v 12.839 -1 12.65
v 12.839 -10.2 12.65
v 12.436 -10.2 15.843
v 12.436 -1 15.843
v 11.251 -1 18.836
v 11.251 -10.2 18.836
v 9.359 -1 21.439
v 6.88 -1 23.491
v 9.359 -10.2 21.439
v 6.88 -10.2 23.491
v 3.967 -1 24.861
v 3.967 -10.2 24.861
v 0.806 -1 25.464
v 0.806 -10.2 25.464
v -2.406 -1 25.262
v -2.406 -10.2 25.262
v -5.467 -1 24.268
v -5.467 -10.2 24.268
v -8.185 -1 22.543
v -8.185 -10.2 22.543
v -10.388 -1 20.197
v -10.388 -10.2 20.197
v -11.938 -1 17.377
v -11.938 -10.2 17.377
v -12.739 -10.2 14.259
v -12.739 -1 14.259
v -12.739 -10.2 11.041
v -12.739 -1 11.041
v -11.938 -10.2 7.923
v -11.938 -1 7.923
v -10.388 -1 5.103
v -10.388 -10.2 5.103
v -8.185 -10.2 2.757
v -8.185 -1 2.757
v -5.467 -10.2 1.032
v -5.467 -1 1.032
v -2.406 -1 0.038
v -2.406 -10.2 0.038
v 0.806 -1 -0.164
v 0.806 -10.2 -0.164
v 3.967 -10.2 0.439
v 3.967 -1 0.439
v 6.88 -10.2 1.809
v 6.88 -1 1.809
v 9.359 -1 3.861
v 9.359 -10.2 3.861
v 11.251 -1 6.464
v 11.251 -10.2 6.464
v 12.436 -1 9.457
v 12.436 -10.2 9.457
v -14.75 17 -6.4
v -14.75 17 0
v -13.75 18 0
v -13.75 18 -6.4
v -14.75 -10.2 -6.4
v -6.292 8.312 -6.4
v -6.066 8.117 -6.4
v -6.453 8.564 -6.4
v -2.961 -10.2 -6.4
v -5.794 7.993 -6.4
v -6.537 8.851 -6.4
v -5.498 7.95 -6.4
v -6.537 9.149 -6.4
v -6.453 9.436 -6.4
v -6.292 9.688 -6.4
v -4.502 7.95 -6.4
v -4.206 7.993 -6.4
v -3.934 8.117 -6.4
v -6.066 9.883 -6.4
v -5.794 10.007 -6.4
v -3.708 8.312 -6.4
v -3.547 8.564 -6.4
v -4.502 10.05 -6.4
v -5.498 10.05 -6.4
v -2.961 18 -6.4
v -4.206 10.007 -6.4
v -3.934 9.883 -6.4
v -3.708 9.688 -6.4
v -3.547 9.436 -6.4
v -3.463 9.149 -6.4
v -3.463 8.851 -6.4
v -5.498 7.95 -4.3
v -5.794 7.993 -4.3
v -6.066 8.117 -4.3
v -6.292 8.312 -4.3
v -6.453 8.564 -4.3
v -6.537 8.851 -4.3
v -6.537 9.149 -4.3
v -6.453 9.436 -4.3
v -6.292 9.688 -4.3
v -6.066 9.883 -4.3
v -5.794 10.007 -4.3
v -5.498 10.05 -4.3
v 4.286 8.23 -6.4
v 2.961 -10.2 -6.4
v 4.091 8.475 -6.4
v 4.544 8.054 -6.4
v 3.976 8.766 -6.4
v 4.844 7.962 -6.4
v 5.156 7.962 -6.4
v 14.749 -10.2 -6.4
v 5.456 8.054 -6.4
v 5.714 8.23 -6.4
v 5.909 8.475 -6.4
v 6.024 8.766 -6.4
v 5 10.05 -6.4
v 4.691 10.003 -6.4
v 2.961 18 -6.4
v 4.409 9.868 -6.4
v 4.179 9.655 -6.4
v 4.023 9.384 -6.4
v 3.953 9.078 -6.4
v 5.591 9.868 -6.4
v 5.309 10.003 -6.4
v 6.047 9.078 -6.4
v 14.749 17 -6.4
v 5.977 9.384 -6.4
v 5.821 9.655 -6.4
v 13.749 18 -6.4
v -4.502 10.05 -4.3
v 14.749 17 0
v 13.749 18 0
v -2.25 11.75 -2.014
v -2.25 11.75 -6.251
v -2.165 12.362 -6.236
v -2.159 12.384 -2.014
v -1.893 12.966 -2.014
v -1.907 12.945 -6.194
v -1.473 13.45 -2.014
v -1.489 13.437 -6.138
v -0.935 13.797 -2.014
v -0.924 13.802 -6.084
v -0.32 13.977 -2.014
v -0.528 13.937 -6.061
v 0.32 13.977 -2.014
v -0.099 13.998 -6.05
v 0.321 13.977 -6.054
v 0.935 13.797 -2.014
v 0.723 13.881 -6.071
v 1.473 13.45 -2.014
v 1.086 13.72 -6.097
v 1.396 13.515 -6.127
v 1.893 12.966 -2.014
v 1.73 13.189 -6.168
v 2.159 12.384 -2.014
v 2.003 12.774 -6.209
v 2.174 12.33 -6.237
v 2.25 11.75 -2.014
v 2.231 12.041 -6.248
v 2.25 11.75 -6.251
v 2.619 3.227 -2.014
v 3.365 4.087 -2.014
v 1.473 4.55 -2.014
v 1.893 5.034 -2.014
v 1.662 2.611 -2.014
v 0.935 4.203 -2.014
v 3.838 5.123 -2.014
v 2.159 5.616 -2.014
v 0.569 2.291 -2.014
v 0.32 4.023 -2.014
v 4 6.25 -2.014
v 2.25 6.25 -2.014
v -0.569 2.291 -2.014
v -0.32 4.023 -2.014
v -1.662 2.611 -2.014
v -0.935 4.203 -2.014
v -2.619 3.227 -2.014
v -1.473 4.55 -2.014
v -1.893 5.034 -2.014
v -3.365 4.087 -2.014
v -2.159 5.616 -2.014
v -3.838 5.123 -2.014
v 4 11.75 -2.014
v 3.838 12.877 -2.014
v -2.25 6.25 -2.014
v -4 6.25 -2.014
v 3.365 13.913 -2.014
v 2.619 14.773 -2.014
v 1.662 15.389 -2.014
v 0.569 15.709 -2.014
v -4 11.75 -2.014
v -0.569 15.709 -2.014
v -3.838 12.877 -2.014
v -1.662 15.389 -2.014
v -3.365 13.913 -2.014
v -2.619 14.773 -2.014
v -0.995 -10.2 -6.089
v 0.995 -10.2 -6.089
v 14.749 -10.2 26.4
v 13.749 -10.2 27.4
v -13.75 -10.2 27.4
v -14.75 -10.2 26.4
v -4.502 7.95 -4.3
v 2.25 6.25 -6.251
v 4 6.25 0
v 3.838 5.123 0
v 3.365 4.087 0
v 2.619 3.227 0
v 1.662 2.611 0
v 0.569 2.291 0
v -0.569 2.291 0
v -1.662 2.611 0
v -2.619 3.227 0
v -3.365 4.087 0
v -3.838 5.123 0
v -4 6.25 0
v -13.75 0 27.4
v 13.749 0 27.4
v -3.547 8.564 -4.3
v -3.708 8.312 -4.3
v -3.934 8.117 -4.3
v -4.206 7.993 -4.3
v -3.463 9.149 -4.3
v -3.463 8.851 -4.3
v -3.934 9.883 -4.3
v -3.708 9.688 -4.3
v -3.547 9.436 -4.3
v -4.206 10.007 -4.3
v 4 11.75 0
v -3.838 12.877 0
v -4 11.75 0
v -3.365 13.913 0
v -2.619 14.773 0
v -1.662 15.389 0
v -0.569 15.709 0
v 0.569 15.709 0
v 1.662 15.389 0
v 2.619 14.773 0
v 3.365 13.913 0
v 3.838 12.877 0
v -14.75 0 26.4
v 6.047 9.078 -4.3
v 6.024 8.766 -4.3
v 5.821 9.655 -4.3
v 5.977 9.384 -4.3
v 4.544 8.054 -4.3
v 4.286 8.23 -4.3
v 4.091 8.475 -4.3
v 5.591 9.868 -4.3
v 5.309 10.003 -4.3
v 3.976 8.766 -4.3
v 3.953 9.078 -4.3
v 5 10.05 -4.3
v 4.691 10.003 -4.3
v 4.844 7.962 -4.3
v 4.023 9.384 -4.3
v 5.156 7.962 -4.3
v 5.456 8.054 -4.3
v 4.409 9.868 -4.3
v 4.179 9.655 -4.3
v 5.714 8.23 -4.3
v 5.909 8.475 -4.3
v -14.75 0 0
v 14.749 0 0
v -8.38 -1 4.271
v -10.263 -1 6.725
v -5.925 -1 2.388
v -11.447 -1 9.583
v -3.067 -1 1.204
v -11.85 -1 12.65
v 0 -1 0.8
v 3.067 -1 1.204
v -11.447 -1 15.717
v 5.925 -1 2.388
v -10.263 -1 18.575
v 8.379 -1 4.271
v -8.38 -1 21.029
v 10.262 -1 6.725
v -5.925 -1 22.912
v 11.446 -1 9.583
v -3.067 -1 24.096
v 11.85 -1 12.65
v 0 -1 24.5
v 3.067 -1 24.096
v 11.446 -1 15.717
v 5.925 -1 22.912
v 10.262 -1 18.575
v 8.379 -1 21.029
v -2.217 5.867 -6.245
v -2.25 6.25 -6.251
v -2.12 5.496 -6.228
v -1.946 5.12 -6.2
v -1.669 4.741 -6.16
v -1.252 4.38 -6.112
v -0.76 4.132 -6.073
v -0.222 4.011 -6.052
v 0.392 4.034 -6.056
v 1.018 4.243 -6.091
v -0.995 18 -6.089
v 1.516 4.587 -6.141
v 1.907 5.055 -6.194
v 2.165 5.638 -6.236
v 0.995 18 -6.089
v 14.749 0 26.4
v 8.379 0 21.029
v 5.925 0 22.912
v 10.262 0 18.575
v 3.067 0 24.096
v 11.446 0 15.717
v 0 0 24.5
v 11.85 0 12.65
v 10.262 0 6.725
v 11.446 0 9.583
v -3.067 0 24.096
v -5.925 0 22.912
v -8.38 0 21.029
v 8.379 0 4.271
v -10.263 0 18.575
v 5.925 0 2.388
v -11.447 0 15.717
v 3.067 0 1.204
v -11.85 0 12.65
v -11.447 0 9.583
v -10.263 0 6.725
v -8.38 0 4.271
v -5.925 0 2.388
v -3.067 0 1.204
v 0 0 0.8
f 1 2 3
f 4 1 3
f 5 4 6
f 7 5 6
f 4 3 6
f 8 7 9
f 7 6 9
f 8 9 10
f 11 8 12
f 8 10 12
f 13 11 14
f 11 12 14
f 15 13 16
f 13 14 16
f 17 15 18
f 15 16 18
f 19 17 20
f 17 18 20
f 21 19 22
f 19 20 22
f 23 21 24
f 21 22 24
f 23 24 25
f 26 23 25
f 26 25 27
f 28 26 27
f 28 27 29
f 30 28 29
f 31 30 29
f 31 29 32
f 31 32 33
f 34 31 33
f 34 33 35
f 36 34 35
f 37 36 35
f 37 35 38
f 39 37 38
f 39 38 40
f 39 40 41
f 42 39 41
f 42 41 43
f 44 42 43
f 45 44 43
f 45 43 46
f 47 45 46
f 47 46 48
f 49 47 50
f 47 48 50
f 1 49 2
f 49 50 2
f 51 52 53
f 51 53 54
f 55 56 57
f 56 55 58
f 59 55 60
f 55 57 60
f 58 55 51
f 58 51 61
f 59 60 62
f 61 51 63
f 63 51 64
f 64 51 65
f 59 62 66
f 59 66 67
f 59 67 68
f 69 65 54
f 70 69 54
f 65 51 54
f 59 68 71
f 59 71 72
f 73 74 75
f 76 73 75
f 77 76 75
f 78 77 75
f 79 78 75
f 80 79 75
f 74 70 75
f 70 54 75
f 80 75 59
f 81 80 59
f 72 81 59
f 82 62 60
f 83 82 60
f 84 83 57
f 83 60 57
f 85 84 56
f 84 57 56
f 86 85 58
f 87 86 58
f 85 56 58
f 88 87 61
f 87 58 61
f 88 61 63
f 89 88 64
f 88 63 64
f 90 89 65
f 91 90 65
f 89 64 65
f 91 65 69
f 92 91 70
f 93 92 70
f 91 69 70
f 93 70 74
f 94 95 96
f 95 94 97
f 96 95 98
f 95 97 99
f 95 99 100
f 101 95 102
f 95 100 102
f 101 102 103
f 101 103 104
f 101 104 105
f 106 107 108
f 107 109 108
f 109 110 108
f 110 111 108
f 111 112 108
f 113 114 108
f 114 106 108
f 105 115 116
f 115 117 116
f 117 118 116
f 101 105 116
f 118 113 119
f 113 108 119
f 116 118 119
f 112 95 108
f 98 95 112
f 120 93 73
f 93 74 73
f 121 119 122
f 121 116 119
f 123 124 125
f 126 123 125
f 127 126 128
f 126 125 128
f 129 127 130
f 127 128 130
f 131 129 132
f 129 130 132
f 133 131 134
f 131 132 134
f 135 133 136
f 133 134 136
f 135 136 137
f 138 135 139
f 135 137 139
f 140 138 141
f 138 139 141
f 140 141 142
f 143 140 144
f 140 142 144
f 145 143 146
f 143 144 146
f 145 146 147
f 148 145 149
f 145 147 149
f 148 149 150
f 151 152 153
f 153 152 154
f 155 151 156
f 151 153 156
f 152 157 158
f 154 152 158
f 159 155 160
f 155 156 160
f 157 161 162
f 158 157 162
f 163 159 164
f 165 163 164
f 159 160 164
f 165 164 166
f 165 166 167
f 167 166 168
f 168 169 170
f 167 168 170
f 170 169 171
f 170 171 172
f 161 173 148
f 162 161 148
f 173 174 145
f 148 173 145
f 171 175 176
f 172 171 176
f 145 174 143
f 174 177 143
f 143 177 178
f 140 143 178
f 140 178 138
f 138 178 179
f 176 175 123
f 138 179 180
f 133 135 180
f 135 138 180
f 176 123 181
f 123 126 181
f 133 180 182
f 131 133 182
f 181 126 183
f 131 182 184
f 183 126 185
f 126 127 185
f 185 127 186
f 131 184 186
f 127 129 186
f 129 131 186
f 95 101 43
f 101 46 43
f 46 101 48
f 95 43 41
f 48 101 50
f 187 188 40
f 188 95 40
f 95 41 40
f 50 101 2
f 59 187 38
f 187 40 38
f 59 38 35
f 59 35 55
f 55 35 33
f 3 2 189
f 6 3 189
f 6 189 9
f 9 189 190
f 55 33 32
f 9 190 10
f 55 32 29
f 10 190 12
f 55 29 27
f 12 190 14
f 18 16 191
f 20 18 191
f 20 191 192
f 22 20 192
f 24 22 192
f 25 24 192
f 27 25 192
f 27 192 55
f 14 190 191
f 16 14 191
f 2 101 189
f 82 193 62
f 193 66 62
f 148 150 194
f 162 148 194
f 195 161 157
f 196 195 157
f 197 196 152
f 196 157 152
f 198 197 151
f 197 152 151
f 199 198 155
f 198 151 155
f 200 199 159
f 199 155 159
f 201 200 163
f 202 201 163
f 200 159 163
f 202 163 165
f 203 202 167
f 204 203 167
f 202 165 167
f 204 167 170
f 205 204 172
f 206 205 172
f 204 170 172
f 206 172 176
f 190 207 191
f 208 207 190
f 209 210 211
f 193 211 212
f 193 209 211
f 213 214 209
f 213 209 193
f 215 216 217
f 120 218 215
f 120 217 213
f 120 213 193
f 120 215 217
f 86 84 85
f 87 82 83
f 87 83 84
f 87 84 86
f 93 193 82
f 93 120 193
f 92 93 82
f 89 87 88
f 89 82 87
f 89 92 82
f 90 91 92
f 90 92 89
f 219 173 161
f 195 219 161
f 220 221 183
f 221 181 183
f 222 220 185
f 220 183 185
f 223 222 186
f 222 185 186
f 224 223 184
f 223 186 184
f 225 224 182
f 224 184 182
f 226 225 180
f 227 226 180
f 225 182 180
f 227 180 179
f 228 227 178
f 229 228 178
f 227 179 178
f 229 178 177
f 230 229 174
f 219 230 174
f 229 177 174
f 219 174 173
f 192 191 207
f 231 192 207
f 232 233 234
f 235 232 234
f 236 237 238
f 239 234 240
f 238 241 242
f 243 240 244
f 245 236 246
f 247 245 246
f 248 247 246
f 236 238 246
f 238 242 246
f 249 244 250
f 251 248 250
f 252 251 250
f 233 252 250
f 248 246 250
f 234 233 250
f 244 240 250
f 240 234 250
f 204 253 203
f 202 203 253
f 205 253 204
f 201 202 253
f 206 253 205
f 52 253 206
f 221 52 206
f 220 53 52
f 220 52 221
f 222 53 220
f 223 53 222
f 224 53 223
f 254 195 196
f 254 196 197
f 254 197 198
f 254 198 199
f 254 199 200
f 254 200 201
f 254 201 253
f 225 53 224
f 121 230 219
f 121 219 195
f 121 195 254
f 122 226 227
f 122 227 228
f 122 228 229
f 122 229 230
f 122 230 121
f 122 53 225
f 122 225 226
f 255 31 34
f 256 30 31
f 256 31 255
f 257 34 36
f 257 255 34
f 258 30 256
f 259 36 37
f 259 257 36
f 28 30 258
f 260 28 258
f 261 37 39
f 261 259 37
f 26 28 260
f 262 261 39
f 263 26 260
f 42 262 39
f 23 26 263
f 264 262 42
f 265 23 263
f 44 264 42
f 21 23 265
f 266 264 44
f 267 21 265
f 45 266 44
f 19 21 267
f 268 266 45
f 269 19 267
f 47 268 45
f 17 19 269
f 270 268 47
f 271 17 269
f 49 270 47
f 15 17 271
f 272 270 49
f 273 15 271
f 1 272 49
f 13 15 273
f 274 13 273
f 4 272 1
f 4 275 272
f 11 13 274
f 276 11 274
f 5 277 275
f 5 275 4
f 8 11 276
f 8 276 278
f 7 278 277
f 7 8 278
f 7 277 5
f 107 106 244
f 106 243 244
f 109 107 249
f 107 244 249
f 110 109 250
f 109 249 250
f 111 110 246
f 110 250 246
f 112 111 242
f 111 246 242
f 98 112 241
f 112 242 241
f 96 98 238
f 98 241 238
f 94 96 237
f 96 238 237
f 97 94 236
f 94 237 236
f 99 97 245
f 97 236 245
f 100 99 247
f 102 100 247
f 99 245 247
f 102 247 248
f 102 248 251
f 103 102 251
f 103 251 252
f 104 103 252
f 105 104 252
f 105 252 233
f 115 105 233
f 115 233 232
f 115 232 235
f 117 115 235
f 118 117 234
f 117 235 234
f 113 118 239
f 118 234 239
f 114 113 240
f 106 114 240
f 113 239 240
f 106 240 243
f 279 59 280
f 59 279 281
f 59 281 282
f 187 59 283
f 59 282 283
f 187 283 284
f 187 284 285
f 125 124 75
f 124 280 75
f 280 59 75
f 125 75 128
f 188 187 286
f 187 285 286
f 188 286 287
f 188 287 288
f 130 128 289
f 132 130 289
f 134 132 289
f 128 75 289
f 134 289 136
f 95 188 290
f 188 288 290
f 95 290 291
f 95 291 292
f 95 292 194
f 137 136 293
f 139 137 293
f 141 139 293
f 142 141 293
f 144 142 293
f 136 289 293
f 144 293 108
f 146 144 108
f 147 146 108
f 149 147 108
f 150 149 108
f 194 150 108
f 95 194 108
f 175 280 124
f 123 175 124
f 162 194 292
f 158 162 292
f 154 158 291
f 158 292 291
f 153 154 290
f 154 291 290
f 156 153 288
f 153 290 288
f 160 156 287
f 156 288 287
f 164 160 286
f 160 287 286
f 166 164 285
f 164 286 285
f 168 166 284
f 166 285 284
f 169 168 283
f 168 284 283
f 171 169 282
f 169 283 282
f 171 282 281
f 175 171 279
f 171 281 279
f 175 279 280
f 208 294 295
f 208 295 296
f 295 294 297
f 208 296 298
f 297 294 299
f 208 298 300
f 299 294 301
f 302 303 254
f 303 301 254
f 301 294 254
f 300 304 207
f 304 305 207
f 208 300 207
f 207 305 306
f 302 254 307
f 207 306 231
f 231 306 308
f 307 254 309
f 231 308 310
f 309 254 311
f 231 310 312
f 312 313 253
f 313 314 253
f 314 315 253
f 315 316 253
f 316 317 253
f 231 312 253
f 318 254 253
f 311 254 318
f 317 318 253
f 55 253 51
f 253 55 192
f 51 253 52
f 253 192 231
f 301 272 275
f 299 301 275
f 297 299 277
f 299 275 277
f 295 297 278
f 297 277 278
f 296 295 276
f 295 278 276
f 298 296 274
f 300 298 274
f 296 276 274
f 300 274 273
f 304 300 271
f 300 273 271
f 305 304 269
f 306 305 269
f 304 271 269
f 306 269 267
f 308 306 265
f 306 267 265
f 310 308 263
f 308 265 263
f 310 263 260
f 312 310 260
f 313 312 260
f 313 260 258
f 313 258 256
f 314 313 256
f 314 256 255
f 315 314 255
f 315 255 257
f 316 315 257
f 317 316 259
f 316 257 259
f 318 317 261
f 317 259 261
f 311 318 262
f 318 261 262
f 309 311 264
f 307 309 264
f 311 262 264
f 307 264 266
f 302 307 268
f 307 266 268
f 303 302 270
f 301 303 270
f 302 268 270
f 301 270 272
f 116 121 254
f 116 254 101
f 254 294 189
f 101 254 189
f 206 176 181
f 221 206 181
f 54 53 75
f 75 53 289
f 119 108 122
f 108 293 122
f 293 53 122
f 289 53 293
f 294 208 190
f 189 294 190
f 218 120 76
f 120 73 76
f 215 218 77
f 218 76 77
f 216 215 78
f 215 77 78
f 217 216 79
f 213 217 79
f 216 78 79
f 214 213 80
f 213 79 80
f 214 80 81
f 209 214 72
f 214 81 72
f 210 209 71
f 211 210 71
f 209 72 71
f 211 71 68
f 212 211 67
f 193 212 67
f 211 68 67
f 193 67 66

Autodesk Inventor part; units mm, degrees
ref_plane "YZ Plane" through (0, 0, 0) normal (1, 0, 0) x (0, 1, 0)
ref_plane "XZ Plane" through (0, 0, 0) normal (0, 1, 0) x (-1, 0, 0)
ref_plane "XY Plane" through (0, 0, 0) normal (0, 0, 1) x (1, 0, 0)
sketch "Sketch4" plane through (0, 0, 0) normal (0, 0, 1) x (1, 0, 0)
  line L0 (-14.75, 18) -> (14.7494, 18)
  line L1 (14.7494, 18) -> (14.7494, -10.2)
  line L2 (14.7494, -10.2) -> (-14.75, -10.2)
  line L3 (-14.75, -10.2) -> (-14.75, 18)
  point P0 (0, 0)
  dimension "d24" = 28.2
  dimension "WIDTH" = 29.4994
  dimension "d26" = 14.75
  dimension "d28" = 10.2
extrude "Extrusion3" add sketch "Sketch4" against normal blind 6.4
sketch "Sketch5" plane through (0, 0, 0) normal (0, 0, 1) x (1, 0, 0)
  line L0 (-14.75, -10.2) -> (14.7494, -10.2)
  line L1 (14.7494, -10.2) -> (14.7494, 0)
  line L2 (14.7494, 0) -> (-14.75, 0)
  line L3 (-14.75, 0) -> (-14.75, -10.2)
  line L4 (-14.75, 18) -> (-14.75, -10.2) projected
  line L5 (-14.75, -10.2) -> (14.7494, -10.2) projected
  line L6 (14.7494, -10.2) -> (14.7494, 18) projected
  point P0 (0, 0)
  dimension "d31" = 0
  dimension "d32" = 0
  dimension "d33" = 0
  dimension "d34" = 0
extrude "Extrusion4" add sketch "Sketch5" along normal blind 27.4
sketch "Sketch7" plane through (-14.75, -10.2, -6.4) normal (0, -1, 0) x (1, 0, 0)
  circle A0 centre (14.7497, 19.05) radius 12.8397
  line L0 (29.4994, 33.8) -> (29.4994, 0) projected
  line L1 (0, 33.8) -> (29.4994, 33.8) projected
  line L2 (29.4994, 0) -> (0, 0) projected
  dimension "PILOT_HOLE" = 25.6794
  dimension "d201" = 19.05
  dimension "d202" = 14.7497
sketch "Sketch9" plane through (0, 0, -6.4) normal (0, 0, -1) x (-1, 0, 0)
  line L0 (14.75, 18) -> (-14.7494, 18) projected
  line L1 (14.75, 0) -> (-14.7494, 0) projected
  line L2 (0, 6.25) -> (0, 11.75) construction
  line L3 (2.25, 6.25) -> (2.25, 11.75)
  line L4 (-2.25, 11.75) -> (-2.25, 6.25)
  arc A0 (-2.25, 6.25) -> (2.25, 6.25) centre (0, 6.25) ccw
  arc A1 (2.25, 11.75) -> (-2.25, 11.75) centre (0, 11.75) ccw
  line L5 (5.498, 9) -> (4.502, 9) construction
  line L6 (5.498, 10.05) -> (4.502, 10.05)
  line L7 (4.502, 7.95) -> (5.498, 7.95)
  arc A2 (5.498, 7.95) -> (5.498, 10.05) centre (5.498, 9) ccw
  arc A3 (4.502, 10.05) -> (4.502, 7.95) centre (4.502, 9) ccw
  point P0 (0, 0)
  point P1 (-5, 9)
  point P2 (0, 9)
  point P3 (5, 9)
  dimension "d183" = 18
  dimension "d185" = 2.25
  dimension "d186" = 5.5
  dimension "d187" = 0
  dimension "d188" = 9
  dimension "d189" = 1.05
  dimension "d190" = 0.996
  dimension "d191" = 0
  dimension "d192" = 5
extrude "Extrusion6" cut sketch "Sketch9" against normal blind 2.1 contours A2 L7 A3 L6
hole "Hole3" at (5, 9, -6.4) direction (0, 0, 1) diameter 2.1 depth 2.1
extrude "Extrusion7" cut sketch "Sketch7" against normal blind 9.2
sketch "Sketch10" plane through (-0.0003, -1, 12.65) normal (0, -1, 0) x (1, 0, 0)
  circle A0 centre (0, 0) radius 11.85
  circle A1 centre (0, 0) radius 12.8397 projected
  point P0 (0.0003, -12.65)
  point P1 (14.75, 3.9316)
  point P2 (-3.9316, -14.75)
  point P3 (5.6018, -14.2)
  point P4 (-7.6497, 13.2099)
  point P5 (-13.2099, 7.6497)
  point P6 (3.9316, -14.75)
  dimension "d96" = 0
  dimension "d97" = 0
  dimension "d98" = 23.7
extrude "Extrusion8" cut sketch "Sketch10" against normal through all contours A0
extrude "Extrusion9" cut sketch "Sketch9" against normal blind 4.386 contours A0 L4 A1 L3
sketch "Sketch11" plane through (0, 0, -2.014) normal (0, 0, -1) x (-1, 0, 0)
  arc A0 (4, 11.75) -> (-4, 11.75) centre (0, 11.75) ccw
  arc A1 (-4, 6.25) -> (4, 6.25) centre (0, 6.25) ccw
  line L0 (-4, 11.75) -> (-4, 6.25)
  line L1 (4, 6.25) -> (4, 11.75)
  point P0 (0, 0)
  point P1 (0, 9)
  dimension "d136" = 8
  dimension "d137" = 8
  dimension "d138" = 0
  dimension "d139" = 5.5
  dimension "d140" = 0
  dimension "d141" = 2.75
  dimension "d142" = 9
extrude "Extrusion10" cut sketch "Sketch11" against normal through all
chamfer "Chamfer10" distance 1 angle 45 4 edges at (14.7494, -5.1, 27.4) (-14.75, -5.1, 27.4) (14.7494, 18, -3.2) (-14.75, 18, -3.2)
sketch "Sketch13" plane through (-13.75, 18, 0) normal (0, 1, 0) x (1, 0, 0)
  circle A0 centre (13.75, 18.75) radius 12.7
  point P0 (13.75, 0)
  dimension "d196" = 0
  dimension "d197" = 25.4
  dimension "d198" = 18.75
extrude "Extrusion11" cut sketch "Sketch13" against normal up to surface (28.2 mm away)
equation "\"d142\" = d131"
equation "\"TOLERANCE\" = 0.05"
equation "\"BEAM_HEIGHT\" = 19.05"
equation "\"d131\" = 9"
properties part number "ADAPTER_SM1"
